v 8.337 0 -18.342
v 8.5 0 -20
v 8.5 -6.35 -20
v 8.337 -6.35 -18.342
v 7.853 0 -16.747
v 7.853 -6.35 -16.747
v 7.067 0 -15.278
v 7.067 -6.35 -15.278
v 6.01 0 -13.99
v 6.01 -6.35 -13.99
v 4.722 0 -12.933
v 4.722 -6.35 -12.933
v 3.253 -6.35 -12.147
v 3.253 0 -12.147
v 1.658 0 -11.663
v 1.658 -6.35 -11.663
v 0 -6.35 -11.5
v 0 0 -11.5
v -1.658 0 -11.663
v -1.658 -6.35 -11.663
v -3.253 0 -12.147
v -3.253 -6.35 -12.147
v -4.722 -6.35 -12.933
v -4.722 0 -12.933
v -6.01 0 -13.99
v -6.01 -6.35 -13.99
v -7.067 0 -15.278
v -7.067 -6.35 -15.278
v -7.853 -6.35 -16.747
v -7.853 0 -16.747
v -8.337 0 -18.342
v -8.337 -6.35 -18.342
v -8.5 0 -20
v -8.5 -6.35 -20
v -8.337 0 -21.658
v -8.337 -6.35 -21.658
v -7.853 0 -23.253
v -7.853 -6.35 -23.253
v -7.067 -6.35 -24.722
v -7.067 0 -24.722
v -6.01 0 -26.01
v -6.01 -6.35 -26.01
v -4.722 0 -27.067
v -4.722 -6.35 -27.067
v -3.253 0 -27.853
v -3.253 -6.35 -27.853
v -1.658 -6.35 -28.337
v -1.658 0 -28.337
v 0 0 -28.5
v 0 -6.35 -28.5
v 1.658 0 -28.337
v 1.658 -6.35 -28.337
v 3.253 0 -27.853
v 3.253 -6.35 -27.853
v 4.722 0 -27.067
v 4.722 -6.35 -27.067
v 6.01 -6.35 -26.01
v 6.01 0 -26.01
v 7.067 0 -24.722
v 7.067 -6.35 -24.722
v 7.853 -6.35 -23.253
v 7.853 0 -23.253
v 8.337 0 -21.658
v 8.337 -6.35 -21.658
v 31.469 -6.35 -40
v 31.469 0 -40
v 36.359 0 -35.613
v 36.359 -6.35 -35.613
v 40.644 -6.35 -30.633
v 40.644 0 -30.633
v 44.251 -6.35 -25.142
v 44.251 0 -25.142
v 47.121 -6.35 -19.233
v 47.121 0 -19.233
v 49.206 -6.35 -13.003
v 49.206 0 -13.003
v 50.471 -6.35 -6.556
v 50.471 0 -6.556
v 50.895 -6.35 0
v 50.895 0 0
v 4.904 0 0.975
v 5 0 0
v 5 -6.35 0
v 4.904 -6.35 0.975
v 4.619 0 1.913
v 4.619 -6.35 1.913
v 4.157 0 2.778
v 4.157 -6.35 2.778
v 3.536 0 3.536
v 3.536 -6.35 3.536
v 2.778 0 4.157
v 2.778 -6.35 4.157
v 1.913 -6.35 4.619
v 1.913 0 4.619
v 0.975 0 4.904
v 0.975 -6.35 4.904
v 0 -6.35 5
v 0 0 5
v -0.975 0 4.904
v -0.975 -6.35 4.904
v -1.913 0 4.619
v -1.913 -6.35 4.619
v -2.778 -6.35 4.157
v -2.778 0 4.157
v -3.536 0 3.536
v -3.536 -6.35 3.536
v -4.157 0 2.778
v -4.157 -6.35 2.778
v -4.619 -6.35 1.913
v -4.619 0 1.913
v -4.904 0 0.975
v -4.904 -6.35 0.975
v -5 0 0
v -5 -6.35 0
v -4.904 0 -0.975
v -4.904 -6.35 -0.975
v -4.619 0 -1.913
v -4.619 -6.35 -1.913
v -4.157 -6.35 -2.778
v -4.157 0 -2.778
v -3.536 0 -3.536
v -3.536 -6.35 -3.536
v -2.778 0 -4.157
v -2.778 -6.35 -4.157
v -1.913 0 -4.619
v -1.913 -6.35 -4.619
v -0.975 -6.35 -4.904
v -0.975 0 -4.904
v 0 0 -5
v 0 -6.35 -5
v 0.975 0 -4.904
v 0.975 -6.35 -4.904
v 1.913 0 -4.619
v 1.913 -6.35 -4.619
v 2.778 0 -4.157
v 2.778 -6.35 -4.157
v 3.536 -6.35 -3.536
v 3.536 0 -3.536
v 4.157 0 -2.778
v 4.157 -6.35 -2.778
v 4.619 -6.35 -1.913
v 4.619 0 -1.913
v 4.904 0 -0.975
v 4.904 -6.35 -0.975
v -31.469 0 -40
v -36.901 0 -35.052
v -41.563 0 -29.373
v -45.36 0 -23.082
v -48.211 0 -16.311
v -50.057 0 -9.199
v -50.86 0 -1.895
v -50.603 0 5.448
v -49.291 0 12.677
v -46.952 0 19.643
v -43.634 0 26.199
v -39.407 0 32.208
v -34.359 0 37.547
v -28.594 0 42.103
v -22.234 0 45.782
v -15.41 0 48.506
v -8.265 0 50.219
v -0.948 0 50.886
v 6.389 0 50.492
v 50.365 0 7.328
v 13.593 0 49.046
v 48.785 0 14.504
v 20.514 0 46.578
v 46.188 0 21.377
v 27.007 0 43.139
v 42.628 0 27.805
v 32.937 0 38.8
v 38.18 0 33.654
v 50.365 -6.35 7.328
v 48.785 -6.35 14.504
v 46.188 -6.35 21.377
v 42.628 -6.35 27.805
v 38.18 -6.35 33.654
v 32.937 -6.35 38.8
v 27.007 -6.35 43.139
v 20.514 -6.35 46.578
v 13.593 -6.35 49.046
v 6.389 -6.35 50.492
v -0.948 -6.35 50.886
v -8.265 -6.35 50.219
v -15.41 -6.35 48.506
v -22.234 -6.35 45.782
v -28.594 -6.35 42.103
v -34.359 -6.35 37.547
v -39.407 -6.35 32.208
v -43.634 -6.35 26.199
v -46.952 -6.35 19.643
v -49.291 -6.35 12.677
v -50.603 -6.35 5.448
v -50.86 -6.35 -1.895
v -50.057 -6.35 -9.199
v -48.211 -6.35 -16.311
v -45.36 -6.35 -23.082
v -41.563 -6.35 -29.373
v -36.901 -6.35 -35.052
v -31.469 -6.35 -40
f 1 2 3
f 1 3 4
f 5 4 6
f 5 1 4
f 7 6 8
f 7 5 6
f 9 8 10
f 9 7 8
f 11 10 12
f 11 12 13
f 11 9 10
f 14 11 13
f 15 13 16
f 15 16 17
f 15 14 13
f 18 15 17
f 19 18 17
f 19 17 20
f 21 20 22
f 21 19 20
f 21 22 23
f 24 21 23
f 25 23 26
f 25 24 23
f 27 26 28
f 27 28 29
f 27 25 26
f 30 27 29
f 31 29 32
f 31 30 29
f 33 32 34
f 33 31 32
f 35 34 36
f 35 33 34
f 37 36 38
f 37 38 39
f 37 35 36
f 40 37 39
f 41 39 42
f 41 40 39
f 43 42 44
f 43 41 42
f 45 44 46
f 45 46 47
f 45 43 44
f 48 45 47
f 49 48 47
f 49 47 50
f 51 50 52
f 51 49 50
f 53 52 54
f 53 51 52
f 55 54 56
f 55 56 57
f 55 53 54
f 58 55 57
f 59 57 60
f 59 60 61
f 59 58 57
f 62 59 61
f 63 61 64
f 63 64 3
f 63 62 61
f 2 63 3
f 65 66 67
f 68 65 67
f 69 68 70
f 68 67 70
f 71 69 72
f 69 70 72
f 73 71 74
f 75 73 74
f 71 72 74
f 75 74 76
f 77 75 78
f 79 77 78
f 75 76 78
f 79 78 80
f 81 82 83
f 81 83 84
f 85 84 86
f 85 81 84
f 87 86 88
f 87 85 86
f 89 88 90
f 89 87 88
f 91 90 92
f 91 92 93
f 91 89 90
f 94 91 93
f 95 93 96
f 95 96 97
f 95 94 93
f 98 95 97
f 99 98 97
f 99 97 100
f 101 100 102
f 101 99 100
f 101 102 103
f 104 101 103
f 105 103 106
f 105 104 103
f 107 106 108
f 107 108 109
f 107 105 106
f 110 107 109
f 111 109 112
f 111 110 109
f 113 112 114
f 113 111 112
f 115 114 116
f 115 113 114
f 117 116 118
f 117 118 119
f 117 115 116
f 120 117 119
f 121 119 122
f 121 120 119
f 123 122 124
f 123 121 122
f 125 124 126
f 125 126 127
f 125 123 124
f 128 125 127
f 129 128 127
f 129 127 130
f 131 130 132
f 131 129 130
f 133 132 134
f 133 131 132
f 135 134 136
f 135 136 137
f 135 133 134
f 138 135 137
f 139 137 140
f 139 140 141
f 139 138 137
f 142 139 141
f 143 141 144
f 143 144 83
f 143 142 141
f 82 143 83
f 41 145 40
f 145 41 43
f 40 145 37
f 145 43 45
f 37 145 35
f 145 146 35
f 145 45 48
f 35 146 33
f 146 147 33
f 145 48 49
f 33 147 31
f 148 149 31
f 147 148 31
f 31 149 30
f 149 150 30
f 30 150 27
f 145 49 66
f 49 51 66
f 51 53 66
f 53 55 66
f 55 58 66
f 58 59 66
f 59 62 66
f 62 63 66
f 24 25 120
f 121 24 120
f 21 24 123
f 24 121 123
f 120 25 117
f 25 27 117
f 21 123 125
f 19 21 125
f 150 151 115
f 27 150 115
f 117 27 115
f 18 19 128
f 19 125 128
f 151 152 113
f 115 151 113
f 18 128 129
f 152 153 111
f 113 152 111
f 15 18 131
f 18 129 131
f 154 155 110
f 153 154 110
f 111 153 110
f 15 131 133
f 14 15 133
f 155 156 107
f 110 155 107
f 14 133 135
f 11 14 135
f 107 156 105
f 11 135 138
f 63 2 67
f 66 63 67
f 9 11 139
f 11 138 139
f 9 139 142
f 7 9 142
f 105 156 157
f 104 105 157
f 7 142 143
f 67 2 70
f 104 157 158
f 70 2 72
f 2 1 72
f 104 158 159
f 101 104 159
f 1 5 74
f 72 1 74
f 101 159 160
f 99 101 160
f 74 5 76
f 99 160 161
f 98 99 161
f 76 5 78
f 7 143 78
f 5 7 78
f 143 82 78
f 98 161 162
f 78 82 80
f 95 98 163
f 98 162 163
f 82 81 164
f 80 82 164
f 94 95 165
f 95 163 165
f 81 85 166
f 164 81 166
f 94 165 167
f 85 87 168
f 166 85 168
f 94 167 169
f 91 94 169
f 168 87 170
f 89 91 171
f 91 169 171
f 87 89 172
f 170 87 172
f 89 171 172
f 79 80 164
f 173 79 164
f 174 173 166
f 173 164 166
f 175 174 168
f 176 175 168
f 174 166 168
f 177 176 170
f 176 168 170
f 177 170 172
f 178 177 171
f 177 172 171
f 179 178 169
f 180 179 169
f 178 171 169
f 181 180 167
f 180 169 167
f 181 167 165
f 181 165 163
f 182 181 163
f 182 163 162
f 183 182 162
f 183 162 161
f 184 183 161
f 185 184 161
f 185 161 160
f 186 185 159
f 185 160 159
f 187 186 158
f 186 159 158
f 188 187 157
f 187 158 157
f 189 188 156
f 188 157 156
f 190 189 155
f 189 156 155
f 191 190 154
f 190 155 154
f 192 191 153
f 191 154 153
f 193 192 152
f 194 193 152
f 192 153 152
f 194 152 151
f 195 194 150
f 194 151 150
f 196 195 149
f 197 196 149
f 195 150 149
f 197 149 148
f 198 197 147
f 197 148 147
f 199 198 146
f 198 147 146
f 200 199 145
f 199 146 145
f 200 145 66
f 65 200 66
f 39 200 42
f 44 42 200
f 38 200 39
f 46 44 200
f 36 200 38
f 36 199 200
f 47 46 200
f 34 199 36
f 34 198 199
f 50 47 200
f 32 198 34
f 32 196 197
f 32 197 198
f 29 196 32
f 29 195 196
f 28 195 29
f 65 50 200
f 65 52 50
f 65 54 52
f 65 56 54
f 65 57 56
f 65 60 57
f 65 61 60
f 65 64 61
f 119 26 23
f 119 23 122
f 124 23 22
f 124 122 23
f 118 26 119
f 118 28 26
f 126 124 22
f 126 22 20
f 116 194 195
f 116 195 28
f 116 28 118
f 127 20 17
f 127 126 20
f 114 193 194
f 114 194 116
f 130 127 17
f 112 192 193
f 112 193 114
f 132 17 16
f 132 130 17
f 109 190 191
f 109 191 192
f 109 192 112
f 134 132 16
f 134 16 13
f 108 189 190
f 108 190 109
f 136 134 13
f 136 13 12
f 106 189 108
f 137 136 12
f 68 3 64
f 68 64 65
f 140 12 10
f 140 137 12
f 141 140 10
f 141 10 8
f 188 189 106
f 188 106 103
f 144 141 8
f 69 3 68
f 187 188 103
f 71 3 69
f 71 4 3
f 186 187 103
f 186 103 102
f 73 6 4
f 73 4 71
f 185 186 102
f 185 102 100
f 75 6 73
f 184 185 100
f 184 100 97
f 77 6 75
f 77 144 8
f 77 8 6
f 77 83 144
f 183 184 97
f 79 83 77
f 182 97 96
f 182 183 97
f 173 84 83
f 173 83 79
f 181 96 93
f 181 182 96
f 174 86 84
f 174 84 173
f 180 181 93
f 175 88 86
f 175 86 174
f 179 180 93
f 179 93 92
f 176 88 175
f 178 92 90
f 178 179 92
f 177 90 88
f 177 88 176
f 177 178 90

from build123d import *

# Parameters (mm, degrees)
F0_R     = 8.5
F0_R_2   = 5
F1_DEPTH = 6.35


with BuildPart() as f1:
    # F0 (on Front) → F1 (new body)
    with BuildSketch(Plane.XZ):
        with BuildLine():
            Line((-31.4690486828, -40), (0, -40))
            Line((0, -40), (31.4690486828, -40))
            ThreePointArc((31.4690486828, -40), (45.7816462008, -22.233800758), (50.895, 0))
            ThreePointArc((50.895, 0), (-22.233800758, 45.7816462008), (-31.4690486828, -40))
        make_face()
        with BuildLine():
            ThreePointArc((0, -40), (-28.2842712475, 28.2842712475), (40, 0))
            ThreePointArc((40, 0), (28.2842712475, -28.2842712475), (0, -40))
        make_face(mode=Mode.SUBTRACT)
        with BuildLine():
            ThreePointArc((0, -40), (28.2842712475, -28.2842712475), (40, 0))
            ThreePointArc((40, 0), (-28.2842712475, 28.2842712475), (0, -40))
        make_face()
        with Locations((0, -20)):
            Circle(F0_R, mode=Mode.SUBTRACT)
        Circle(F0_R_2, mode=Mode.SUBTRACT)
    extrude(amount=F1_DEPTH)


solid = f1.part
